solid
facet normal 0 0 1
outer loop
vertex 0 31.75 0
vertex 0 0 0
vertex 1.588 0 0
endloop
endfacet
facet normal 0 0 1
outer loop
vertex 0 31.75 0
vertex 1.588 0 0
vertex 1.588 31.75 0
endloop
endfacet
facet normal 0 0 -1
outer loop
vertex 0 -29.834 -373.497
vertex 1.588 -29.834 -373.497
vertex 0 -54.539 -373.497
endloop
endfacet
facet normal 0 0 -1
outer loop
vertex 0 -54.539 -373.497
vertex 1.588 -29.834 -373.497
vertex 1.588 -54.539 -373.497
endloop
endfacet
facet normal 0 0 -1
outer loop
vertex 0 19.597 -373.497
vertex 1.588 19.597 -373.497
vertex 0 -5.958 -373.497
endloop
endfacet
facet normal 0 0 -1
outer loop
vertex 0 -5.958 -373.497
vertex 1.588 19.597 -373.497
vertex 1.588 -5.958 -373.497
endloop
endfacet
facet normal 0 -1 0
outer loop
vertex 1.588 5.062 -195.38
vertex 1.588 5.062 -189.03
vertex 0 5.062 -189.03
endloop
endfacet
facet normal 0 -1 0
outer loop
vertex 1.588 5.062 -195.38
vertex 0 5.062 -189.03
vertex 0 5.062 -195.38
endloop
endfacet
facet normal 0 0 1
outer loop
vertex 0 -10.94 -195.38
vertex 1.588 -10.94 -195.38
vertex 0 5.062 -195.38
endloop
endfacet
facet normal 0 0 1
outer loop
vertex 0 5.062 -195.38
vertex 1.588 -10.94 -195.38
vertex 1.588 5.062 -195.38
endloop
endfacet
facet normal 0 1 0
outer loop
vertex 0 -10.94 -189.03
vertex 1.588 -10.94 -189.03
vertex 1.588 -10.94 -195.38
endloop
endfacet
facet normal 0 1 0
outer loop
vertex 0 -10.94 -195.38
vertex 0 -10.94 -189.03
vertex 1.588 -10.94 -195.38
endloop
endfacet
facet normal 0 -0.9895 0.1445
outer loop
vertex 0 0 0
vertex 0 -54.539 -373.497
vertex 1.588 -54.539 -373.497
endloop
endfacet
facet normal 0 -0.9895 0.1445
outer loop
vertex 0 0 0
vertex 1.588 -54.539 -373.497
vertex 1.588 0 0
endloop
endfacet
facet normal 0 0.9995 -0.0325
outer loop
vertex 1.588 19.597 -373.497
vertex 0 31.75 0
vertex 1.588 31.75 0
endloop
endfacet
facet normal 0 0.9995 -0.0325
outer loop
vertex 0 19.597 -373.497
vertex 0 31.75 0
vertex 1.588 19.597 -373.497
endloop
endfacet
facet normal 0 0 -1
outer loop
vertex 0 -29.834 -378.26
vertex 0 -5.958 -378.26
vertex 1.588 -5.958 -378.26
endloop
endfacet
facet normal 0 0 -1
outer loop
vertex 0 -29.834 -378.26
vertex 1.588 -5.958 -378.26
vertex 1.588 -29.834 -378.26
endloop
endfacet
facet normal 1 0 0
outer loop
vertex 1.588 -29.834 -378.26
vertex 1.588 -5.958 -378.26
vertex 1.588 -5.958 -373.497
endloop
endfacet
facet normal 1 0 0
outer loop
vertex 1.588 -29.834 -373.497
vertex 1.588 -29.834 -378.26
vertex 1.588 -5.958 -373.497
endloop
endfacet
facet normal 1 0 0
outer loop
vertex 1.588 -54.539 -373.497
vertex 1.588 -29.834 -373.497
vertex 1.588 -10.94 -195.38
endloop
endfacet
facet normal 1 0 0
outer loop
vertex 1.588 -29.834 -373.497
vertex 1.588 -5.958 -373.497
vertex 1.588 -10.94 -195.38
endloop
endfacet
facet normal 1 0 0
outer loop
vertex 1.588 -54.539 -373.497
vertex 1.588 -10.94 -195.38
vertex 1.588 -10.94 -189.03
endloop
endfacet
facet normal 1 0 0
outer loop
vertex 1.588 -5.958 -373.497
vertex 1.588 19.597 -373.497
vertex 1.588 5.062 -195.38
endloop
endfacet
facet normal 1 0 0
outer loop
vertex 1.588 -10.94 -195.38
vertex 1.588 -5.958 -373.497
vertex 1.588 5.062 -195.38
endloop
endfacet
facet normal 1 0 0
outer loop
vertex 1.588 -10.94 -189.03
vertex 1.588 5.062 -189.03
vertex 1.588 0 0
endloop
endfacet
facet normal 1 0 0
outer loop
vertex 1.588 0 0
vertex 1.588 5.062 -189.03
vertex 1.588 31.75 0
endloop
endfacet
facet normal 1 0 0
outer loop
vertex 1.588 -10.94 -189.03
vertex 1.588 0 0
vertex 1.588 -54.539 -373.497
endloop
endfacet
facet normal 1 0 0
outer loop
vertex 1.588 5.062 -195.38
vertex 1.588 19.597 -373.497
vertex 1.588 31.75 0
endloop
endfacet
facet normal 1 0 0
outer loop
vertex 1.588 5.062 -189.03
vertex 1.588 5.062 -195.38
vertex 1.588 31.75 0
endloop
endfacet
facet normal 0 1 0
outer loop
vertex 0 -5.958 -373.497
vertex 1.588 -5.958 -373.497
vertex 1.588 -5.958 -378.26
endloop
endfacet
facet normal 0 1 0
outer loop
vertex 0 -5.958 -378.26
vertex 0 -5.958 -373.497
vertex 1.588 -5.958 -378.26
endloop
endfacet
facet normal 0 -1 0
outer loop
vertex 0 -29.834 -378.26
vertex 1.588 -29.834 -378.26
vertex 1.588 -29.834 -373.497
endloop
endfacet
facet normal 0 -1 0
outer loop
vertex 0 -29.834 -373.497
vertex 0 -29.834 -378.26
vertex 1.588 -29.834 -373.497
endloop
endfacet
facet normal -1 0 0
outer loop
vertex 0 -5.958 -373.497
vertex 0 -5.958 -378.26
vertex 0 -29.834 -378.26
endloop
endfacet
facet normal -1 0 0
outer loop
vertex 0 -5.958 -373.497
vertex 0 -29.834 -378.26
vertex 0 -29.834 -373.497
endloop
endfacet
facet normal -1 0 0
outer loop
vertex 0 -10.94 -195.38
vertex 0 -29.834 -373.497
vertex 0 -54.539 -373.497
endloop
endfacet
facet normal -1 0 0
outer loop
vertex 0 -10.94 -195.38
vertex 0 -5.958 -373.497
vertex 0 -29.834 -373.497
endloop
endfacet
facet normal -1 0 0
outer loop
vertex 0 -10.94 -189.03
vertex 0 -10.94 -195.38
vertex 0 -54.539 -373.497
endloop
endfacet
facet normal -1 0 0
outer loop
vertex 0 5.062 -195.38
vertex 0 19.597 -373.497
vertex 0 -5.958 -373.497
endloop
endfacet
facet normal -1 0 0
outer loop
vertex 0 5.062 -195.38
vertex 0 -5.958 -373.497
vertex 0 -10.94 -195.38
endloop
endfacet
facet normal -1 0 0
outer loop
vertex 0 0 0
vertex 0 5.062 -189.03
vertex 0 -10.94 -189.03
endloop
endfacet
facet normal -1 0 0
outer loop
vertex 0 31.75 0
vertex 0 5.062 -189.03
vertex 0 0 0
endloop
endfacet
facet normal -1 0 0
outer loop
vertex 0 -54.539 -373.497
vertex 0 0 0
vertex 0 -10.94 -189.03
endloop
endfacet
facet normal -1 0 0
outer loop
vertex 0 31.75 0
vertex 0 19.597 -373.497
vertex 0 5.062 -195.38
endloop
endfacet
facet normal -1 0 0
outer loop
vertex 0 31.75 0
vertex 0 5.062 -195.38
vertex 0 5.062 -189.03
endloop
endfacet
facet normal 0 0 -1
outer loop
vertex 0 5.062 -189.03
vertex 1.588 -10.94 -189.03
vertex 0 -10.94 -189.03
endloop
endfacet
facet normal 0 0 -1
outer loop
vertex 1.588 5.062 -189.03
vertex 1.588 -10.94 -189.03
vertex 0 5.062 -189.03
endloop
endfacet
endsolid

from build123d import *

# Parameters (mm, degrees)
BOSS_EXTRUDE1_DEPTH = 1.5875
CUT_EXTRUDE2_DEPTH  = 383.274521188
SKETCH4_W           = 6.35
SKETCH4_H           = 16.002
CUT_EXTRUDE3_DEPTH  = 1.5875


with BuildPart() as part:
    # Sketch1 → Boss-Extrude1 (new body)
    with BuildSketch(Plane(origin=(0, 0, 0), x_dir=(0, 0, -1), z_dir=(1, 0, 0))):
        Polygon((0, 0), (0, 31.75), (378.259807404, 19.441884667), (378.259807404, -55.234115333), align=None)
    extrude(amount=BOSS_EXTRUDE1_DEPTH)

    # Sketch3 → Cut-Extrude2 (cut, through all)
    with BuildSketch(Plane(origin=(1.5875, 0, 0), x_dir=(0, 0, -1), z_dir=(1, 0, 0))):
        Polygon((378.259807404, -55.234115333), (378.259807404, -29.834115333), (373.497307404, -29.834115333), (373.497307404, -54.538687299), align=None)
        Polygon((378.259807404, 19.441884667), (373.497307404, 19.59685064), (373.497307404, -5.958115333), (378.259807404, -5.958115333), align=None)
    extrude(amount=-CUT_EXTRUDE2_DEPTH, mode=Mode.SUBTRACT)

    # Sketch4 → Cut-Extrude3 (cut)
    with BuildSketch(Plane(origin=(1.5875, 0, 0), x_dir=(0, 0, -1), z_dir=(1, 0, 0))):
        with Locations((192.204807404, -2.939176237)):
            Rectangle(SKETCH4_W, SKETCH4_H)
    extrude(amount=-CUT_EXTRUDE3_DEPTH, mode=Mode.SUBTRACT)


solid = part.part
